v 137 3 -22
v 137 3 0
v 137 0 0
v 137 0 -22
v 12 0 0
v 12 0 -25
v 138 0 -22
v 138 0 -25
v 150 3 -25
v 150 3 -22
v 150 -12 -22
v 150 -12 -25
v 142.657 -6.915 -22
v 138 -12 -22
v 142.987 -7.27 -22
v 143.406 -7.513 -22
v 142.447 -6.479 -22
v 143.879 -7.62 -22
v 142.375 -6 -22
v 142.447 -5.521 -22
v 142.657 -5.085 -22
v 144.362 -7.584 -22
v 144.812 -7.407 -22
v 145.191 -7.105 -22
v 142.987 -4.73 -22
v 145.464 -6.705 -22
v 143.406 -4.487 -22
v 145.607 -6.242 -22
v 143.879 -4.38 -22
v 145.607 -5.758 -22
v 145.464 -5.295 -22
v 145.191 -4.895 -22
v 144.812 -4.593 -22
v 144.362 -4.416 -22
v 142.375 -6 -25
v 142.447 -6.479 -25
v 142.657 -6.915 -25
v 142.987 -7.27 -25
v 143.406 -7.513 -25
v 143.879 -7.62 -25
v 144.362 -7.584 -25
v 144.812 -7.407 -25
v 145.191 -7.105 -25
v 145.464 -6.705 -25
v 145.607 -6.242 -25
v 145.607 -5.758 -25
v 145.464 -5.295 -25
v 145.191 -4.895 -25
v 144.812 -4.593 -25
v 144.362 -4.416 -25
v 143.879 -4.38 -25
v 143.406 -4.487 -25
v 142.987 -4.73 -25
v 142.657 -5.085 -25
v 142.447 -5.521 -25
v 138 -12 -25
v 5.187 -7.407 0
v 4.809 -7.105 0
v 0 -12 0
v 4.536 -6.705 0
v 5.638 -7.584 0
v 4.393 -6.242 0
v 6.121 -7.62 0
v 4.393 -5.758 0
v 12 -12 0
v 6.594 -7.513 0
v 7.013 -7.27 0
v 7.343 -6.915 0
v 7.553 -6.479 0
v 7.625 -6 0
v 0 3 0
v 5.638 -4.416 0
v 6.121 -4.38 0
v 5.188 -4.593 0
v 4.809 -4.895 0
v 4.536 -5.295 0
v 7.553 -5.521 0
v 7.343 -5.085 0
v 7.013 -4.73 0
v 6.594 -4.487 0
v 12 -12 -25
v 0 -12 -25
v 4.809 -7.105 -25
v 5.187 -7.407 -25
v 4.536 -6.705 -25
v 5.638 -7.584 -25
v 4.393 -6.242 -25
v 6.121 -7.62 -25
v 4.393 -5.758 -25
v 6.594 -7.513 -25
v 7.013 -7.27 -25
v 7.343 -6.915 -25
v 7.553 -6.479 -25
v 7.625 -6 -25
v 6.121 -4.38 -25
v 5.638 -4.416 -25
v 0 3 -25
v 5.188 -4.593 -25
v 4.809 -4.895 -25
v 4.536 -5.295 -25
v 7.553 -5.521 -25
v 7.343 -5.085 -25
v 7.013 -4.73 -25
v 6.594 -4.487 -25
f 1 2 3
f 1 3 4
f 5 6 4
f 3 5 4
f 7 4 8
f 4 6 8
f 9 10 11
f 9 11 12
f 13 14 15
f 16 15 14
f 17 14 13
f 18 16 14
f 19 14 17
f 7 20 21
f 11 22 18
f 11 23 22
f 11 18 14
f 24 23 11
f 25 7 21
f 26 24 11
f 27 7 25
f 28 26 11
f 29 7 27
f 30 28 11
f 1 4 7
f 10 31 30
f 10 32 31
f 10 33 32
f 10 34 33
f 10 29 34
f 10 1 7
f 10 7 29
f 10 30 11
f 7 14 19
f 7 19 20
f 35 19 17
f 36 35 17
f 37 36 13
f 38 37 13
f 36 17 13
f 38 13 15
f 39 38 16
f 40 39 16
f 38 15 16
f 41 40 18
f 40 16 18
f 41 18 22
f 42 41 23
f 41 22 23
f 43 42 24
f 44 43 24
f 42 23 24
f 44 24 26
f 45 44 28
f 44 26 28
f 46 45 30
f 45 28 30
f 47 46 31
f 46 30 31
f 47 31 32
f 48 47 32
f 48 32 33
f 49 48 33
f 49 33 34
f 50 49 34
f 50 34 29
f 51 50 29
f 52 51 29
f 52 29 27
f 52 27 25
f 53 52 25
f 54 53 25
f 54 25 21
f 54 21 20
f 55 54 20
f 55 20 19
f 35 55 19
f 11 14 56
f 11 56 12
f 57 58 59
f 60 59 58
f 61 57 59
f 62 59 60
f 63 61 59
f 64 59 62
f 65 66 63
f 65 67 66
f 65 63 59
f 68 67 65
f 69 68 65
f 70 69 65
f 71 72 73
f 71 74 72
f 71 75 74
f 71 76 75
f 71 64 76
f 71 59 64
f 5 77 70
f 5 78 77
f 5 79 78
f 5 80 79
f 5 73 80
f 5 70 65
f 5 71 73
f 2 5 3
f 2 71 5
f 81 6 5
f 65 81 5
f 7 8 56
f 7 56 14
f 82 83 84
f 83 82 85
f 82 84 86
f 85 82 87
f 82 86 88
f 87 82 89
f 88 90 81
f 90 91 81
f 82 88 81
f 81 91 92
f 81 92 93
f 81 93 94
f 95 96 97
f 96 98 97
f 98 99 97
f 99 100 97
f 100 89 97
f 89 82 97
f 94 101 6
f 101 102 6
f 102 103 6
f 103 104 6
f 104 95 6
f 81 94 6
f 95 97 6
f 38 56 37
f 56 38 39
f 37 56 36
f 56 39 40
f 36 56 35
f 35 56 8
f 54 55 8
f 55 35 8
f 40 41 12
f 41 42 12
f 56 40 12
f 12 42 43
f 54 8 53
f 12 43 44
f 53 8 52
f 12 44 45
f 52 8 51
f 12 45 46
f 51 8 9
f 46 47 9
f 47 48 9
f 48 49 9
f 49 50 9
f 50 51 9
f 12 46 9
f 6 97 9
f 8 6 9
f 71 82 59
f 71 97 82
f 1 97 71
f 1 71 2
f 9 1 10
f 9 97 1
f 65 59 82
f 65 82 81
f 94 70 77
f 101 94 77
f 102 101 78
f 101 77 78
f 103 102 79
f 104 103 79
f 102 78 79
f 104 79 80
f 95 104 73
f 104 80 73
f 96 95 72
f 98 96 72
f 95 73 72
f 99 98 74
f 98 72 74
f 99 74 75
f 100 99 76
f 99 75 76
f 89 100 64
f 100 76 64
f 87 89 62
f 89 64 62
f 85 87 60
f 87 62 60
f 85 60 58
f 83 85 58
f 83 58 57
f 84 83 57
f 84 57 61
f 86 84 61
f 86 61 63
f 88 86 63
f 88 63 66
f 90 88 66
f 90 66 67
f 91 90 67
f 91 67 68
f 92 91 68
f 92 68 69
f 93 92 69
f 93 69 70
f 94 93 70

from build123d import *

# Parameters (mm, degrees)
SKETCH1_W           = 150
SKETCH1_H           = 25
BOSS_EXTRUDE1_DEPTH = 3
SKETCH2_W           = 12
SKETCH2_H           = 25
BOSS_EXTRUDE2_DEPTH = 12
SKETCH4_R           = 1.625
CUT_EXTRUDE1_DEPTH  = 153.541797551
SKETCH5_W           = 13
SKETCH5_H           = 22
CUT_EXTRUDE2_DEPTH  = 153.807067899


with BuildPart() as part:
    # Sketch1 → Boss-Extrude1 (new body)
    with BuildSketch(Plane(origin=(0, 0, 0), x_dir=(1, 0, 0), z_dir=(0, 1, 0))):
        with Locations((75, 12.5)):
            Rectangle(SKETCH1_W, SKETCH1_H)
    extrude(amount=BOSS_EXTRUDE1_DEPTH)

    # Sketch2 → Boss-Extrude2 (add)
    with BuildSketch(Plane.XZ):
        with Locations((6, -12.5)):
            Rectangle(SKETCH2_W, SKETCH2_H)
        with Locations((144, -12.5)):
            Rectangle(SKETCH2_W, SKETCH2_H)
    extrude(amount=BOSS_EXTRUDE2_DEPTH)

    # Sketch4 → Cut-Extrude1 (cut, through all)
    with BuildSketch(Plane.XY):
        with Locations((6, -6)):
            Circle(SKETCH4_R)
        with Locations(Location((144, -6, 0), (0, 0, 180))):
            Circle(SKETCH4_R)
    extrude(amount=-CUT_EXTRUDE1_DEPTH, mode=Mode.SUBTRACT)

    # Sketch5 → Cut-Extrude2 (cut, through all)
    with BuildSketch(Plane(origin=(0, 3, 0), x_dir=(1, 0, 0), z_dir=(0, 1, 0))):
        with Locations((143.5, 11)):
            Rectangle(SKETCH5_W, SKETCH5_H)
    extrude(amount=-CUT_EXTRUDE2_DEPTH, mode=Mode.SUBTRACT)


solid = part.part
